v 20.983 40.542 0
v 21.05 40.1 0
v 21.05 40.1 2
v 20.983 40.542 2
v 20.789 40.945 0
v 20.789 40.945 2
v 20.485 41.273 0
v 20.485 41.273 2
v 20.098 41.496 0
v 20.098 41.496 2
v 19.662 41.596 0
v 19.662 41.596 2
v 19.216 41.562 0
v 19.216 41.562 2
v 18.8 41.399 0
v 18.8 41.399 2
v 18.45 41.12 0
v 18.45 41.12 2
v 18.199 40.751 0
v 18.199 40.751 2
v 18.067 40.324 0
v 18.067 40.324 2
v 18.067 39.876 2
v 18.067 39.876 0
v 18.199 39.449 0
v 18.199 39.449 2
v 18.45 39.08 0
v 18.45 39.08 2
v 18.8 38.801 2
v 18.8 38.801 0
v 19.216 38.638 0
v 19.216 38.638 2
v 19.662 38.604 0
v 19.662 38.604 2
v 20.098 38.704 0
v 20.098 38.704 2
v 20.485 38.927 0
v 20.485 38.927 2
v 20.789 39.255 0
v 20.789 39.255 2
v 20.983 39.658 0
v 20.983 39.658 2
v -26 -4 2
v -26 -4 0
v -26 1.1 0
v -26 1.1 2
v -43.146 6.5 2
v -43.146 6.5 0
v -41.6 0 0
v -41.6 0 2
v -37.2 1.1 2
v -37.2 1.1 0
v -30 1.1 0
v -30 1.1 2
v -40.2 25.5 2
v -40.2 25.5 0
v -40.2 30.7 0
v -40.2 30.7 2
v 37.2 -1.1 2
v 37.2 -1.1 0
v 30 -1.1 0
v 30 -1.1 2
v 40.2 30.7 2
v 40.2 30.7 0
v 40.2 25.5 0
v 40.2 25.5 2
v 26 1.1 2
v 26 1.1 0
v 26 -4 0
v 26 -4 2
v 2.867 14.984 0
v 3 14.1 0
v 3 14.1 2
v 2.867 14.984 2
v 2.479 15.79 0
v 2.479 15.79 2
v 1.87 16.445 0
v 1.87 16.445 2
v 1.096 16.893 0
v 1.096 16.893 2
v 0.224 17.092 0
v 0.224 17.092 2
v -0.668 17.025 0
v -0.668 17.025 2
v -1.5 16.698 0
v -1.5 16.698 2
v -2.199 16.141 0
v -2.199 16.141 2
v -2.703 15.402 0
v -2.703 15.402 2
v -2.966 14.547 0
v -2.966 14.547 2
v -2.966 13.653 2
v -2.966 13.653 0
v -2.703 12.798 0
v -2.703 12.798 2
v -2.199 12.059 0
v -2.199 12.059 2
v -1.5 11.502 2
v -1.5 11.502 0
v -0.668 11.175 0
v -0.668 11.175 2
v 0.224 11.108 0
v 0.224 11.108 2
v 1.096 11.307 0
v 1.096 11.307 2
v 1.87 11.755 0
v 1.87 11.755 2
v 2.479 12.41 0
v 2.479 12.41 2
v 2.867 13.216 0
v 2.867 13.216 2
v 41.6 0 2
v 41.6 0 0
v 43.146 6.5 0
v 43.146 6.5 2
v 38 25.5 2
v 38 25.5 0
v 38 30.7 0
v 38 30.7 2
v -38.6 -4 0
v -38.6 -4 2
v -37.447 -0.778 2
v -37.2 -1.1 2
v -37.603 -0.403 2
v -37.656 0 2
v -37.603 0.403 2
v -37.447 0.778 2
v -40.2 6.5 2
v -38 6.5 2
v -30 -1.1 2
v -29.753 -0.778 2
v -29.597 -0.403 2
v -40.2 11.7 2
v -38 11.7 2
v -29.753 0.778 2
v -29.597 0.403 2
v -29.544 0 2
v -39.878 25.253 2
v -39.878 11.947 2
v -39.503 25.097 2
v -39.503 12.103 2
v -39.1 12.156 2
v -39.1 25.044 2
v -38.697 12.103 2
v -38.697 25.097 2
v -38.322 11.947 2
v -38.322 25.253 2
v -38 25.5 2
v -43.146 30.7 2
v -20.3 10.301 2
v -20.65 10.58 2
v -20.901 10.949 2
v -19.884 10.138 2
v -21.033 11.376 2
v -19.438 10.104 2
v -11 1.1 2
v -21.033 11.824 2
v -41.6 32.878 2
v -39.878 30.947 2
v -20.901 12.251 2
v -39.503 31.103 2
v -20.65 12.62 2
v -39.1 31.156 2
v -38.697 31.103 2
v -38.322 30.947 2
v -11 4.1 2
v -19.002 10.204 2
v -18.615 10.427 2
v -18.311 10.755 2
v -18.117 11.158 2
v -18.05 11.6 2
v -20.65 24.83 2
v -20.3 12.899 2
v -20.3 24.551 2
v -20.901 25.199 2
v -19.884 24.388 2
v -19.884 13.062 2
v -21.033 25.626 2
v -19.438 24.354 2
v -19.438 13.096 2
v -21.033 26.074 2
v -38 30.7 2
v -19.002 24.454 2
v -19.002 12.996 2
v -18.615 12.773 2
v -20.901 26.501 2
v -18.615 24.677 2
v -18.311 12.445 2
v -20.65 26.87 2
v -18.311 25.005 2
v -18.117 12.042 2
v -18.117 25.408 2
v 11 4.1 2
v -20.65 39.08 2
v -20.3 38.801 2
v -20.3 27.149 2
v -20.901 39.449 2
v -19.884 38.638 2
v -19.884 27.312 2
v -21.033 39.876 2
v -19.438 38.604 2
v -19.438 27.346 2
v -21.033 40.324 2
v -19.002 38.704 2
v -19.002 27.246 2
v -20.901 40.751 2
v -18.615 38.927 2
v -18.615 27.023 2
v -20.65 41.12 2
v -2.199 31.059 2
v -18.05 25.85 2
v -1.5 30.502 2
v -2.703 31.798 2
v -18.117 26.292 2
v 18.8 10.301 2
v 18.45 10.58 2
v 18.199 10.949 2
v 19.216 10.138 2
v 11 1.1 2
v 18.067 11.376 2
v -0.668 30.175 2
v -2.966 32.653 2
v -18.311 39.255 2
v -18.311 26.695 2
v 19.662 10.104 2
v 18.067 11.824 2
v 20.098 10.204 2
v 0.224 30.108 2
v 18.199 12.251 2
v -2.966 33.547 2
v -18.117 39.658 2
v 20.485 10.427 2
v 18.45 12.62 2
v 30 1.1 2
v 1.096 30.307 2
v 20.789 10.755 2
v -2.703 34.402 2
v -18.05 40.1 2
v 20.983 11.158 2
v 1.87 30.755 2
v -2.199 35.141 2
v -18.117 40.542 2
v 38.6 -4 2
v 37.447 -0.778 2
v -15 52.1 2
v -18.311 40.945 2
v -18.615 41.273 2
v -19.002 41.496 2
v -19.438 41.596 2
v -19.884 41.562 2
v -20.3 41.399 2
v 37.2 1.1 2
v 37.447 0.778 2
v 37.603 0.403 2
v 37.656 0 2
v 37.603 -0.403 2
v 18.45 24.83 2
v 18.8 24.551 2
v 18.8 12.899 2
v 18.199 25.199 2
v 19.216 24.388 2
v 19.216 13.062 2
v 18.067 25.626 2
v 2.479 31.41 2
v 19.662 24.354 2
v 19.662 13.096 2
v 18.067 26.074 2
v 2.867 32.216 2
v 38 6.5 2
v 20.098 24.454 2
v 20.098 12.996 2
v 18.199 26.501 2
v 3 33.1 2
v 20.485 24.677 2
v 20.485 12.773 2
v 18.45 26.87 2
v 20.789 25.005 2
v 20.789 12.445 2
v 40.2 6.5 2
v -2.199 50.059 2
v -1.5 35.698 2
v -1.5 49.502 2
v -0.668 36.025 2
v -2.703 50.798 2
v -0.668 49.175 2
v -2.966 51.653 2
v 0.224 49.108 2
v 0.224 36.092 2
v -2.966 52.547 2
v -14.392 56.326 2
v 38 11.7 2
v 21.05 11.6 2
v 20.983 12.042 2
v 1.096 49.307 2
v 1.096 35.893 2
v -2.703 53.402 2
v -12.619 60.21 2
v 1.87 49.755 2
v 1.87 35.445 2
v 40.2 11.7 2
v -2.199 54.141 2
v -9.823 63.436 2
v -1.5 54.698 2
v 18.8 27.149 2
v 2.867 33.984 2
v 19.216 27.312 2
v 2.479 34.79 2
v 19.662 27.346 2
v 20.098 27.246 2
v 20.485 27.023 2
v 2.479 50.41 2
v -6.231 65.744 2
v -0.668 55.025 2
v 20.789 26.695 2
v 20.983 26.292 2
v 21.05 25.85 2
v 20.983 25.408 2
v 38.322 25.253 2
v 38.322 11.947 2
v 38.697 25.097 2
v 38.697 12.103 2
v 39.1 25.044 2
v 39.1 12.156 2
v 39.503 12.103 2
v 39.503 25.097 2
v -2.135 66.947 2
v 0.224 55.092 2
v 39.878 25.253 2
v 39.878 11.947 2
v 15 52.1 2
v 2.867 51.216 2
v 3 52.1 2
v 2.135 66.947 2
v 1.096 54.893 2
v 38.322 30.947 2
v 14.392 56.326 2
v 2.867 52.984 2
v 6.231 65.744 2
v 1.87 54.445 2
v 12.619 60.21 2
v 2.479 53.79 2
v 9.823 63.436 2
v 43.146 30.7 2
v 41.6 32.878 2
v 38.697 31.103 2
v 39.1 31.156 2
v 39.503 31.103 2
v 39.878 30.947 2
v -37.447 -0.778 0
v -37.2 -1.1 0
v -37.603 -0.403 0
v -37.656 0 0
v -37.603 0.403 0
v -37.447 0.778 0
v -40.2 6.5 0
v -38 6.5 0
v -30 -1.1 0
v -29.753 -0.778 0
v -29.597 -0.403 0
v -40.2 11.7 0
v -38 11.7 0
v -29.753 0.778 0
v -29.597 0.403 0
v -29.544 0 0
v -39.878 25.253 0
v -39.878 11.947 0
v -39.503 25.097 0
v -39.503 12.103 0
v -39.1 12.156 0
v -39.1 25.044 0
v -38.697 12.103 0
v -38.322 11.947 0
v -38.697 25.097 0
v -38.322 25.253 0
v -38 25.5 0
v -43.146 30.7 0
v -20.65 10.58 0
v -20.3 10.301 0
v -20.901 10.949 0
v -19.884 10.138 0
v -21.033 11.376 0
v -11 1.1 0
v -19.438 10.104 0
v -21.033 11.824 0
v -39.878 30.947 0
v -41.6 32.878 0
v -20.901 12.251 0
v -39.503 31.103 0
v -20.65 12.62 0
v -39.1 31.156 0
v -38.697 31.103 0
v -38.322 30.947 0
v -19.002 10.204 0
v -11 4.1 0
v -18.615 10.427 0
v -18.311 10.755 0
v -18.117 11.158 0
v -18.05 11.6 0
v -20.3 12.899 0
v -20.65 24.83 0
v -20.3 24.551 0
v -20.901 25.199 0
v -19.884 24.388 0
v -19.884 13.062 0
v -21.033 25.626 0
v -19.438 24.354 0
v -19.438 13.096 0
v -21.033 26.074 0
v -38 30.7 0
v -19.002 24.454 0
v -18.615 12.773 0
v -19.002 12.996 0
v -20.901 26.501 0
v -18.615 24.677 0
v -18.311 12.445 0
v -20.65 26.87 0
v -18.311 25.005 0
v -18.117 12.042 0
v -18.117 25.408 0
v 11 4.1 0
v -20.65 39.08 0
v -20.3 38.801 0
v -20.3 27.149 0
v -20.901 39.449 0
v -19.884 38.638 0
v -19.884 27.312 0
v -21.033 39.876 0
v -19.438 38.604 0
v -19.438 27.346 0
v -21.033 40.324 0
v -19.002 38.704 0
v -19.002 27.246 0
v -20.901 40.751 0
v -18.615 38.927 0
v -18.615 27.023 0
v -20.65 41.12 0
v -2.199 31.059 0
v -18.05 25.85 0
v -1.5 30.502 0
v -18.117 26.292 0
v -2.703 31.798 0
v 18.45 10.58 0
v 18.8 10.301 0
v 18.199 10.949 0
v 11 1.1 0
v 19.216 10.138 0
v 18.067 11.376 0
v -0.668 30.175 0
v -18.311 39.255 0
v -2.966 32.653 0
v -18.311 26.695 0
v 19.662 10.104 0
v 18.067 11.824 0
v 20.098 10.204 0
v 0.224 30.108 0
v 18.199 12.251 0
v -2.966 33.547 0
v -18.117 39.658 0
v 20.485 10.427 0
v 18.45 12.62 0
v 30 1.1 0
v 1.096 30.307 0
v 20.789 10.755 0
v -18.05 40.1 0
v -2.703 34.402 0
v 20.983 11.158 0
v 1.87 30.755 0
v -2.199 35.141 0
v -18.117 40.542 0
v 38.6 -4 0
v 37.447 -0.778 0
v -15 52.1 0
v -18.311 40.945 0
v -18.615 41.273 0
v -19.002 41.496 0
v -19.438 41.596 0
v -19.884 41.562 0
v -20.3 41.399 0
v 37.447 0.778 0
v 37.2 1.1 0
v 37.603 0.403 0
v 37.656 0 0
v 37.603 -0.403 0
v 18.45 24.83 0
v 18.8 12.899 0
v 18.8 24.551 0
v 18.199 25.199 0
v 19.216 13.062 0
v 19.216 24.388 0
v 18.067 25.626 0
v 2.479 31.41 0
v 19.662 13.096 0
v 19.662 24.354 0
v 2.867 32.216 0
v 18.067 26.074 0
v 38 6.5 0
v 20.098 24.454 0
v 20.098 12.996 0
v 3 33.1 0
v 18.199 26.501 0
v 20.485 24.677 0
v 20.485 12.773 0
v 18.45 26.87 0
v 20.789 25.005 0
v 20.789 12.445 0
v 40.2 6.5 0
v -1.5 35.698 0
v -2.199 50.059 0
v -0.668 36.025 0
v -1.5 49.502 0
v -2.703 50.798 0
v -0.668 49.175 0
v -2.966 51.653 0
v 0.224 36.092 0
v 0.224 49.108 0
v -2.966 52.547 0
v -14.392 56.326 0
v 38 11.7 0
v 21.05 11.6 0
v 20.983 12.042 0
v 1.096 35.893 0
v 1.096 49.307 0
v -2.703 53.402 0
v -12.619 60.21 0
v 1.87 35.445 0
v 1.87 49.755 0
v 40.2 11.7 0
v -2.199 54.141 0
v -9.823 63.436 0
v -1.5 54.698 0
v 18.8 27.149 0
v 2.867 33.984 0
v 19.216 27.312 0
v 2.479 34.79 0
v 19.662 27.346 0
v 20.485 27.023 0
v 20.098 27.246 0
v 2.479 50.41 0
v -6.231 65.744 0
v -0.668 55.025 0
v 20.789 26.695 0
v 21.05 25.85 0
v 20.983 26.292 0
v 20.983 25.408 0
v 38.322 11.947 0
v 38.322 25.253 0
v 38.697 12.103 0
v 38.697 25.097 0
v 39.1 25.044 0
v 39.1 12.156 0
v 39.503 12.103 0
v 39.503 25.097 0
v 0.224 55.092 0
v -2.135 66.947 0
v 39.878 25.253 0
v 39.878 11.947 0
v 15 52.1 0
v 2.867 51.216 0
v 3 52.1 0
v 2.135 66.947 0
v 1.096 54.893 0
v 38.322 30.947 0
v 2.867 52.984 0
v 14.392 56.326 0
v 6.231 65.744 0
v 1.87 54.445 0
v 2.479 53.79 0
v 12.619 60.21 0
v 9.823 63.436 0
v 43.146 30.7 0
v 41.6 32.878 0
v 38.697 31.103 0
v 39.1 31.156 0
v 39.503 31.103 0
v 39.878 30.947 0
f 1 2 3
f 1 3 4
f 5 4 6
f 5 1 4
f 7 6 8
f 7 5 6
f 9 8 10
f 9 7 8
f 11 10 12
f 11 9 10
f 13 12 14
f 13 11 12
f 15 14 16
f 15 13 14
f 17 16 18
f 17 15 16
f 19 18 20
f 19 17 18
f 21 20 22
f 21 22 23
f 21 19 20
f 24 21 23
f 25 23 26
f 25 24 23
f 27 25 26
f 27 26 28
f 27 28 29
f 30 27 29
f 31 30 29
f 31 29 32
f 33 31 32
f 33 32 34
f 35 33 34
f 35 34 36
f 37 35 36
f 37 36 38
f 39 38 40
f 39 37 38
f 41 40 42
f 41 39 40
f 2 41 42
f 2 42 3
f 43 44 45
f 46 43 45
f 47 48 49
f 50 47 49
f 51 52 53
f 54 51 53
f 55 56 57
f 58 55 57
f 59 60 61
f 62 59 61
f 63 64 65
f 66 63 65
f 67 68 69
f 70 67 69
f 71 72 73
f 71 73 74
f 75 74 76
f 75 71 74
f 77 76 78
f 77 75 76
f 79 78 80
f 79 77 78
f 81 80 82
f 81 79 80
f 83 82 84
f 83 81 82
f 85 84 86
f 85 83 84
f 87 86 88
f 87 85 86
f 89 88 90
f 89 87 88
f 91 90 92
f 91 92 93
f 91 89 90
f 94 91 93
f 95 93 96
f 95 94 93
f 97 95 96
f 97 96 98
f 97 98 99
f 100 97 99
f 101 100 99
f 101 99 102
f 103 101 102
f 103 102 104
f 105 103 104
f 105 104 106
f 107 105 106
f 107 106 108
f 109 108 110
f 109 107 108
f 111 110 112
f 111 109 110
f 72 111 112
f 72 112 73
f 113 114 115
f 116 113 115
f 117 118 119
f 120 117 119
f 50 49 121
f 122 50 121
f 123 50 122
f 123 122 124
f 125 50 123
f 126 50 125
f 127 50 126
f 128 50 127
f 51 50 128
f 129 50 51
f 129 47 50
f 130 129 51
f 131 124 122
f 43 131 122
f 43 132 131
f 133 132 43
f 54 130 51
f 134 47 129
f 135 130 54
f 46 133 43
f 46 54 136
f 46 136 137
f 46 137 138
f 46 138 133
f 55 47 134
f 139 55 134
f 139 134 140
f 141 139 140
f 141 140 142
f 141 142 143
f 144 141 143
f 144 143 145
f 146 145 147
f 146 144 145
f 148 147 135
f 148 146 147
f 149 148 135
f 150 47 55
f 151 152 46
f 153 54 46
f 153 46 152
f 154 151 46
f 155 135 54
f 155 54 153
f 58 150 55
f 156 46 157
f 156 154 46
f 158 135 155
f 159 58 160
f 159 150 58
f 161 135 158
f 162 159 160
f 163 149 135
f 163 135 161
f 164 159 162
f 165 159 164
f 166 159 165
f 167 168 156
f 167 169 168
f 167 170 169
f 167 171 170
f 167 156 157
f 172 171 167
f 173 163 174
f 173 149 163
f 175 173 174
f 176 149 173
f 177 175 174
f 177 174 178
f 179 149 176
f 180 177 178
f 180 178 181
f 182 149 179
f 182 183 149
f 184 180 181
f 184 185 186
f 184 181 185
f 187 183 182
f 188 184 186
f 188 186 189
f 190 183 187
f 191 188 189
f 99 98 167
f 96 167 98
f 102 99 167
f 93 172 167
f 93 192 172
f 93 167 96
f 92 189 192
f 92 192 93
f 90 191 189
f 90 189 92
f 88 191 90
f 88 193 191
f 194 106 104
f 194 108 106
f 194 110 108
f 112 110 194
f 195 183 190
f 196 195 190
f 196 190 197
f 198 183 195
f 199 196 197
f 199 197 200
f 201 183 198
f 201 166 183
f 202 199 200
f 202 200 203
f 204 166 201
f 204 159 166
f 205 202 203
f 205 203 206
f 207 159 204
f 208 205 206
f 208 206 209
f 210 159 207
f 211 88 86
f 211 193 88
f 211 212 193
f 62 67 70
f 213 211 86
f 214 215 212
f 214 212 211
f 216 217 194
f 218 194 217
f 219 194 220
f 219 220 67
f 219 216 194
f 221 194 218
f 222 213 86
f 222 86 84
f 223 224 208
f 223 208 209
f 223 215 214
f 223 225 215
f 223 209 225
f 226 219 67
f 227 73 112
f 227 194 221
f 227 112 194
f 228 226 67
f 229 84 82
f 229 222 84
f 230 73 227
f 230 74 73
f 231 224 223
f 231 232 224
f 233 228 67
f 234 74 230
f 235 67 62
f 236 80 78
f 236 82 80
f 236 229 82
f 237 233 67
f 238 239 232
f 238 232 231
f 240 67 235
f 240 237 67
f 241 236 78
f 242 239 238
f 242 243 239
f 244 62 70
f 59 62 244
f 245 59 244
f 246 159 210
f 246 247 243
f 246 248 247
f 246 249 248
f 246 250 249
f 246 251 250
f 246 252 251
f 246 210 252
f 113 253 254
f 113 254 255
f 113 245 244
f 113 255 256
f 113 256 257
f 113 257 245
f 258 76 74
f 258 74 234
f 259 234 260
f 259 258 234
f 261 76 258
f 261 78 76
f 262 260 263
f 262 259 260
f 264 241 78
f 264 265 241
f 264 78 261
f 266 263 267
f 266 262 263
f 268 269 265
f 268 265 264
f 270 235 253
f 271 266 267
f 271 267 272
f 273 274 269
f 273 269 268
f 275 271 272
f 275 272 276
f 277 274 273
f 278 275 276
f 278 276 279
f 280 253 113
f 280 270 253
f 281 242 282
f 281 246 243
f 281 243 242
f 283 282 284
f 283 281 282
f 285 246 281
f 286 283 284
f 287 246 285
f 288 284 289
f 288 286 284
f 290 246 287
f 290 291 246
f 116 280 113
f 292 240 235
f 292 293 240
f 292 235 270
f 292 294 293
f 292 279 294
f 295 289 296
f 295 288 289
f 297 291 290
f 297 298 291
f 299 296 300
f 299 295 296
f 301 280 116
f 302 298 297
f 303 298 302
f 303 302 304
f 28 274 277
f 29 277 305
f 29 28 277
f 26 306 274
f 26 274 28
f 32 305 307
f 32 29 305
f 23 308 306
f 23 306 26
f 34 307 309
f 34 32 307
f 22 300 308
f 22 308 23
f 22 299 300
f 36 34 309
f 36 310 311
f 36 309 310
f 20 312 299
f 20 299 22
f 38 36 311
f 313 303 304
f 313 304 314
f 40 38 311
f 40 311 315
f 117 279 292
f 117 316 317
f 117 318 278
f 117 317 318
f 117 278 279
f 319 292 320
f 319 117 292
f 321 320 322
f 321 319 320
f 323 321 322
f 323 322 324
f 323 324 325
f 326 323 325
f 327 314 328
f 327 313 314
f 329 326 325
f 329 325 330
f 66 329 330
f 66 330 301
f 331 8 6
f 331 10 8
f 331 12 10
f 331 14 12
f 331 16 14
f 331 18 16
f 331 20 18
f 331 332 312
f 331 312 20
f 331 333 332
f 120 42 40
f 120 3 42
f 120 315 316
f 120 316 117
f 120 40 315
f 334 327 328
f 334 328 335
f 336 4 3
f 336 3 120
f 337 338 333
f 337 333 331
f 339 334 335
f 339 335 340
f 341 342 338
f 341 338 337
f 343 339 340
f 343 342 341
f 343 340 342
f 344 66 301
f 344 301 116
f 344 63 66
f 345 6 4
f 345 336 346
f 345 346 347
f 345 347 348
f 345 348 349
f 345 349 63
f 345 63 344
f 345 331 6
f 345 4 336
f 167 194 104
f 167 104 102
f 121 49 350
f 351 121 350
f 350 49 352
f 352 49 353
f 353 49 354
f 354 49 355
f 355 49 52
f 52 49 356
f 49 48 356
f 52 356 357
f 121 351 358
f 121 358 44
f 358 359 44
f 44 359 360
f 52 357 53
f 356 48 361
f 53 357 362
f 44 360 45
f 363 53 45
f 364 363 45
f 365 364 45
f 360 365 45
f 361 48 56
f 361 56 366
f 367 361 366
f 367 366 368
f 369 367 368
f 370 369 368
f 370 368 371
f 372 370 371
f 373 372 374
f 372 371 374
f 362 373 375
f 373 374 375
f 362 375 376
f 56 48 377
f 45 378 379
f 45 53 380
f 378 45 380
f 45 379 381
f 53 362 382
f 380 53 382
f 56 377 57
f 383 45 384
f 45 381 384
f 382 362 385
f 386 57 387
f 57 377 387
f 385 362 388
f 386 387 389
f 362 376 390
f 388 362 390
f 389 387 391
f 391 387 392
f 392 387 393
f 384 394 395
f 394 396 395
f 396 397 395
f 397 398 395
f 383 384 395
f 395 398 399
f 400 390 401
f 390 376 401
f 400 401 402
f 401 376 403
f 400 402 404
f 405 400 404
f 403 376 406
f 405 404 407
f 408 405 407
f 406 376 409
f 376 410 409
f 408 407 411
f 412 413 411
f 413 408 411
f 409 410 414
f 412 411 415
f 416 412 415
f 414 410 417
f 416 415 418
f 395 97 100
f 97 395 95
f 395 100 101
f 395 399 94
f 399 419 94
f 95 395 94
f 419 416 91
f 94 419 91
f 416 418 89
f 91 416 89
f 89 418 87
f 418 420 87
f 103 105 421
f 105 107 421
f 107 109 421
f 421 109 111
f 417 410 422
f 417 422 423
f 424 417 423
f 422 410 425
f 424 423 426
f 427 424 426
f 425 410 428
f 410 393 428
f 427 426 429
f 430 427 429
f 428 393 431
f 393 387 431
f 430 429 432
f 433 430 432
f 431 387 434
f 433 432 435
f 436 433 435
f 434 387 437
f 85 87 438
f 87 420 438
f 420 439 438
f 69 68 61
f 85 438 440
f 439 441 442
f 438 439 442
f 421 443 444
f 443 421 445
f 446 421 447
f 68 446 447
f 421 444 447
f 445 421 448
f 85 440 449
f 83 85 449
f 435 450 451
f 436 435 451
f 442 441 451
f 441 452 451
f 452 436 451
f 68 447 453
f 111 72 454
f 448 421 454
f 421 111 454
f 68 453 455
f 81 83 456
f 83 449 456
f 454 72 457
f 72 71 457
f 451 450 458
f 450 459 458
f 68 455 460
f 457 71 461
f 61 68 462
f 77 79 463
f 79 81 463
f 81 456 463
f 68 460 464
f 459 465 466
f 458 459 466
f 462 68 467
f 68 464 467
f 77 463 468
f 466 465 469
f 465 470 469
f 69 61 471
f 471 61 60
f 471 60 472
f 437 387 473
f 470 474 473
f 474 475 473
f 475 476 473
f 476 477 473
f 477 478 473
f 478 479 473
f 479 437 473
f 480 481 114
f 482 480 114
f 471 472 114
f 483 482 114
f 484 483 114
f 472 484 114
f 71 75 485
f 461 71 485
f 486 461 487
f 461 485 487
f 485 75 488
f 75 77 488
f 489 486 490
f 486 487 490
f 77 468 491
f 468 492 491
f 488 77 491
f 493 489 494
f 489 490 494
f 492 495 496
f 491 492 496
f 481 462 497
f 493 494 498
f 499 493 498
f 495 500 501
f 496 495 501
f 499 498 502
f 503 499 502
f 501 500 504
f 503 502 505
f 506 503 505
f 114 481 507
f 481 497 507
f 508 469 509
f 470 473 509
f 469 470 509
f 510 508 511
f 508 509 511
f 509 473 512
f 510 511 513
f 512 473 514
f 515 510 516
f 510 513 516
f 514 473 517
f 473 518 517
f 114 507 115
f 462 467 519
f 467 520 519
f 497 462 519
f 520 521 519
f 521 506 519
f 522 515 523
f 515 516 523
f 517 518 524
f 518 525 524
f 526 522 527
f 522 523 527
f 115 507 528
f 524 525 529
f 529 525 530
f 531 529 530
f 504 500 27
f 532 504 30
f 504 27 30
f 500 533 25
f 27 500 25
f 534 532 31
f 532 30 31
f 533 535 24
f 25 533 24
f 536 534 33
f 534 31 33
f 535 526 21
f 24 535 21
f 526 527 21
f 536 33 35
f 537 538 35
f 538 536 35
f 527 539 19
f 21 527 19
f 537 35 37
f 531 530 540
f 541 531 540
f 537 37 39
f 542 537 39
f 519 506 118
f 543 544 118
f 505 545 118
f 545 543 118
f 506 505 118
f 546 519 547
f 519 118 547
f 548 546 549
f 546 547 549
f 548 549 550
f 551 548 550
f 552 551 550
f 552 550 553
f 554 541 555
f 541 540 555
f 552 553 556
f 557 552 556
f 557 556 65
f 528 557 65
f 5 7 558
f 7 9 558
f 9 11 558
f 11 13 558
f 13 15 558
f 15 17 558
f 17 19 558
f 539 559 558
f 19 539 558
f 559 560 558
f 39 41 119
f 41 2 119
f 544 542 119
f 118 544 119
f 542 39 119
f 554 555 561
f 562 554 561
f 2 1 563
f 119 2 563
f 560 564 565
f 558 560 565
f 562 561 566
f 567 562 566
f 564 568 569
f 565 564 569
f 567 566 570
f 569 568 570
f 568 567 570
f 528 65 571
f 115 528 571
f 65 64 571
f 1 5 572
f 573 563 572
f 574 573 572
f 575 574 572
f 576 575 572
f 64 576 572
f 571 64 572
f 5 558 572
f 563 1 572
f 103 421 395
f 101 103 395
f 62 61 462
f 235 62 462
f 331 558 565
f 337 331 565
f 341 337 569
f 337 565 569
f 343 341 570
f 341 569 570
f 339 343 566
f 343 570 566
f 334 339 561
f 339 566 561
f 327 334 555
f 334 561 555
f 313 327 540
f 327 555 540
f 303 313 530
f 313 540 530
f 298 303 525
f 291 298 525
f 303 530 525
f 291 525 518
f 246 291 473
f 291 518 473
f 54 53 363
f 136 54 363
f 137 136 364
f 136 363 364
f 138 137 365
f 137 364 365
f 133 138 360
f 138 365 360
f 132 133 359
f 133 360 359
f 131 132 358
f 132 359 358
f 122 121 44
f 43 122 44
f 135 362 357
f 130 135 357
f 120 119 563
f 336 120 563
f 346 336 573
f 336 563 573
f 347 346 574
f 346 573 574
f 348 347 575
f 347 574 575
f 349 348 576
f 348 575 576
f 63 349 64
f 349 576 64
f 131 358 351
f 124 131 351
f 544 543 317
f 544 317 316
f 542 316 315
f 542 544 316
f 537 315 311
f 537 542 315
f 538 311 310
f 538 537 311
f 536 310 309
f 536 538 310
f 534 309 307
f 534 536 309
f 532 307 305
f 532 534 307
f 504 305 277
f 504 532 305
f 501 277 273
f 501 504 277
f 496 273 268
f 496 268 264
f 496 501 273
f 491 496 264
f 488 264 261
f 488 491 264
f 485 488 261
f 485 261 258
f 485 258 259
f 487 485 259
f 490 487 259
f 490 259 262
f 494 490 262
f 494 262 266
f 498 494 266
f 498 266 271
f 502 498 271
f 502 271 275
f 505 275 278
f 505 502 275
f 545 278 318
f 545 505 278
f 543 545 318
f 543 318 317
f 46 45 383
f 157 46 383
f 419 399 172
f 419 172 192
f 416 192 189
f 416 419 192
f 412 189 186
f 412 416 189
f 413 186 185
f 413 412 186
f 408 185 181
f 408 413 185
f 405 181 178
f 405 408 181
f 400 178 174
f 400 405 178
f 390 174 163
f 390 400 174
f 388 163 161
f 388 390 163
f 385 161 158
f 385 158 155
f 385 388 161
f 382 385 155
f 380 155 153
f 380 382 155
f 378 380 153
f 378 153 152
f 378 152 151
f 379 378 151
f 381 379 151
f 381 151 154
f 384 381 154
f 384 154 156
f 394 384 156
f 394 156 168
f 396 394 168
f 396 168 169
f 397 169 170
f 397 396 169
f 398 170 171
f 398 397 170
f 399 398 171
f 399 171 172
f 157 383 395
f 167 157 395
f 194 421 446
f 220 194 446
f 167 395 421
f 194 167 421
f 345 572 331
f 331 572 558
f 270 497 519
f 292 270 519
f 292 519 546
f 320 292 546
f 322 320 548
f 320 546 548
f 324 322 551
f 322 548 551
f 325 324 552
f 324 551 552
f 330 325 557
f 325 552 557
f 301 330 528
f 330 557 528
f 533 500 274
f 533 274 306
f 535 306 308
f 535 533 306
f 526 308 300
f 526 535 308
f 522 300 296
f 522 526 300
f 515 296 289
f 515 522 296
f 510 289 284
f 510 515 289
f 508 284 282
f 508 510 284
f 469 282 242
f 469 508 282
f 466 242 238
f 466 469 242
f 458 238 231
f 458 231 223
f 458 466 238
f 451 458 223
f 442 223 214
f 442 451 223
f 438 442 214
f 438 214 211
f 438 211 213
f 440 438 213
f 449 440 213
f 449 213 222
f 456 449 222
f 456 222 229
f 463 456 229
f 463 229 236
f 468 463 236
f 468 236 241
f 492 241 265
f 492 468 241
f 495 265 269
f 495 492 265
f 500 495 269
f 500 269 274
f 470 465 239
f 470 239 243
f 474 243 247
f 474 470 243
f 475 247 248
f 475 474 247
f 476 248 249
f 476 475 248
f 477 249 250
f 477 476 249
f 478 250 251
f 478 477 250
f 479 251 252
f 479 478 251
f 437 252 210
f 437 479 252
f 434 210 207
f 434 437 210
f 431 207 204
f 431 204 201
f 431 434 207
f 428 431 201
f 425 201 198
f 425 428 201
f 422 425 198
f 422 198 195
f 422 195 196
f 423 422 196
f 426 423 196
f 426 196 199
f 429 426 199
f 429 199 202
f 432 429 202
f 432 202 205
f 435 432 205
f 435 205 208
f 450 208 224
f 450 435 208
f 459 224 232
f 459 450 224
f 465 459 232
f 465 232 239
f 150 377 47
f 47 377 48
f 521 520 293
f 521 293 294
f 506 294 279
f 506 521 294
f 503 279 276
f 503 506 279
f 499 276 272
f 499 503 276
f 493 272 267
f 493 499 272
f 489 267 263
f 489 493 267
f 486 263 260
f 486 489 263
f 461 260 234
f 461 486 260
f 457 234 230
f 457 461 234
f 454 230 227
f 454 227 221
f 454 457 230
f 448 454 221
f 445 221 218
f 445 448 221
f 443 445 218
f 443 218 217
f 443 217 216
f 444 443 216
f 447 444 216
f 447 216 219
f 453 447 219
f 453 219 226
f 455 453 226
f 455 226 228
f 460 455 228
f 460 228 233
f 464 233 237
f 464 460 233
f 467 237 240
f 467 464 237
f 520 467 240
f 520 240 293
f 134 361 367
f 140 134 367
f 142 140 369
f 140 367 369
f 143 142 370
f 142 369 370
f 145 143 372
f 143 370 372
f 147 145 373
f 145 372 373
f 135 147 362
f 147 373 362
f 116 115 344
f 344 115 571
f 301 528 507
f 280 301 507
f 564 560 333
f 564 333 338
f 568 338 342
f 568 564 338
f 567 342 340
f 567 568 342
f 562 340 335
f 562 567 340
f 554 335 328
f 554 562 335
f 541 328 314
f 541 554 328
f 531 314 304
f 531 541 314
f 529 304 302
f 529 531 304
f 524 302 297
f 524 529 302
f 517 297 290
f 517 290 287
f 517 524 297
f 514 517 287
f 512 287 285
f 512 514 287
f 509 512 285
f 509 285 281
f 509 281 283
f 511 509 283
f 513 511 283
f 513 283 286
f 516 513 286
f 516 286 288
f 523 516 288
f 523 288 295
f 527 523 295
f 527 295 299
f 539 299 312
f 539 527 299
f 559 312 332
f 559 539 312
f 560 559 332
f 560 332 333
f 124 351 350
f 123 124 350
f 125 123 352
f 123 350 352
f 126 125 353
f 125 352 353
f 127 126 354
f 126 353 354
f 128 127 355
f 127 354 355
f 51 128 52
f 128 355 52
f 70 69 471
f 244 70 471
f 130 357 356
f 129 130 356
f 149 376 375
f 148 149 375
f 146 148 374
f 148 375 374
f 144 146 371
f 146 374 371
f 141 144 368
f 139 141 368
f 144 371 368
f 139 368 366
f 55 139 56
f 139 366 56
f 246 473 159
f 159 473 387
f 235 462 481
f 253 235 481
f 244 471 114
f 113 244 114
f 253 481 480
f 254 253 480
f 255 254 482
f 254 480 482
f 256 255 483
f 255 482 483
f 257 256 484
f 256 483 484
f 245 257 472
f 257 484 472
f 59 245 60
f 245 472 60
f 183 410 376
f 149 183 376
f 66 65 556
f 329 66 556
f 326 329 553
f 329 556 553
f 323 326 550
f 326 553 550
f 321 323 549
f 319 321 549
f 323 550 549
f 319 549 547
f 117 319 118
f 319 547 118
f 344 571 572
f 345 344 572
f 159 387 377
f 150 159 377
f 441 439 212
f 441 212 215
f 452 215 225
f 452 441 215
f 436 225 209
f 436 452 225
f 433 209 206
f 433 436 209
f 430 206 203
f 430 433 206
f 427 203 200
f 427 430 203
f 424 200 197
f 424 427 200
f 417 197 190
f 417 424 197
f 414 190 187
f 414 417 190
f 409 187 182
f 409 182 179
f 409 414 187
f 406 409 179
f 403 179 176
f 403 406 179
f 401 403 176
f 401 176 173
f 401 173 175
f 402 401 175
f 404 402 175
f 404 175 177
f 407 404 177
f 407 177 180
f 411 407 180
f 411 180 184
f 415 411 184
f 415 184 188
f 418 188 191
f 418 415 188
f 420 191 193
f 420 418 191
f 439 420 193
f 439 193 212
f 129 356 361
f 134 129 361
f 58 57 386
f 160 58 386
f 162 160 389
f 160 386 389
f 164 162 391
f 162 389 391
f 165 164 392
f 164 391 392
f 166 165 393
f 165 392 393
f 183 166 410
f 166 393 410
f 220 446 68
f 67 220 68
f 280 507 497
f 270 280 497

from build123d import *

# Parameters (mm, degrees)
SKETCH_1_R      = 1.5
SKETCH_1_R_2    = 3
EXTRUDE_1_DEPTH = 2


with BuildPart() as part:
    # 草图1 → 凸台-拉伸1 (new body)
    with BuildSketch(Plane.XY):
        with BuildLine():
            Line((-38.6, -4), (-33.6, -4))
            Line((-33.6, -4), (-26, -4))
            Line((-26, -4), (-26, 1.1))
            Line((-26, 1.1), (-11, 1.1))
            Line((-11, 1.1), (-11, 4.1))
            Line((-11, 4.1), (11, 4.1))
            Line((11, 4.1), (11, 1.1))
            Line((11, 1.1), (26, 1.1))
            Line((26, 1.1), (26, -4))
            Line((26, -4), (33.6, -4))
            Line((33.6, -4), (38.6, -4))
            Line((38.6, -4), (41.6, 0))
            Line((41.6, 0), (43.145657482, 6.5))
            Line((43.145657482, 6.5), (43.145657482, 30.7))
            Line((43.145657482, 30.7), (41.6, 32.877506789))
            Line((41.6, 32.877506789), (15, 52.1))
            ThreePointArc((15, 52.1), (0, 67.1), (-15, 52.1))
            Line((-15, 52.1), (-41.6, 32.877506789))
            Line((-41.6, 32.877506789), (-43.145657482, 30.7))
            Line((-43.145657482, 30.7), (-43.145657482, 6.5))
            Line((-43.145657482, 6.5), (-41.6, 0))
            Line((-41.6, 0), (-38.6, -4))
        make_face()
        with BuildLine():
            Line((-30, -1.1), (-37.2, -1.1))
            ThreePointArc((-37.2, -1.1), (-37.655634919, 0), (-37.2, 1.1))
            Line((-37.2, 1.1), (-30, 1.1))
            ThreePointArc((-30, 1.1), (-29.544365081, 0), (-30, -1.1))
        make_face(mode=Mode.SUBTRACT)
        with BuildLine():
            Line((-40.2, 6.5), (-40.2, 11.7))
            ThreePointArc((-40.2, 11.7), (-39.1, 12.155634919), (-38, 11.7))
            Line((-38, 11.7), (-38, 6.5))
            Line((-38, 6.5), (-40.2, 6.5))
        make_face(mode=Mode.SUBTRACT)
        with Locations((-19.55, 11.6)):
            Circle(SKETCH_1_R, mode=Mode.SUBTRACT)
        with BuildLine():
            Line((-38, 30.7), (-38, 25.5))
            ThreePointArc((-38, 25.5), (-39.1, 25.044365081), (-40.2, 25.5))
            Line((-40.2, 25.5), (-40.2, 30.7))
            ThreePointArc((-40.2, 30.7), (-39.1, 31.155634919), (-38, 30.7))
        make_face(mode=Mode.SUBTRACT)
        with Locations((-19.55, 25.85)):
            Circle(SKETCH_1_R, mode=Mode.SUBTRACT)
        with Locations((19.55, 11.6)):
            Circle(SKETCH_1_R, mode=Mode.SUBTRACT)
        with BuildLine():
            Line((30, 1.1), (37.2, 1.1))
            ThreePointArc((37.2, 1.1), (37.655634919, 0), (37.2, -1.1))
            Line((37.2, -1.1), (30, -1.1))
            Line((30, -1.1), (30, 1.1))
        make_face(mode=Mode.SUBTRACT)
        with BuildLine():
            Line((38, 6.5), (38, 11.7))
            ThreePointArc((38, 11.7), (39.1, 12.155634919), (40.2, 11.7))
            Line((40.2, 11.7), (40.2, 6.5))
            Line((40.2, 6.5), (38, 6.5))
        make_face(mode=Mode.SUBTRACT)
        with Locations((0, 14.1)):
            Circle(SKETCH_1_R_2, mode=Mode.SUBTRACT)
        with Locations((19.55, 25.85)):
            Circle(SKETCH_1_R, mode=Mode.SUBTRACT)
        with BuildLine():
            Line((40.2, 30.7), (40.2, 25.5))
            ThreePointArc((40.2, 25.5), (39.1, 25.044365081), (38, 25.5))
            Line((38, 25.5), (38, 30.7))
            ThreePointArc((38, 30.7), (39.1, 31.155634919), (40.2, 30.7))
        make_face(mode=Mode.SUBTRACT)
        with Locations((-19.55, 40.1)):
            Circle(SKETCH_1_R, mode=Mode.SUBTRACT)
        with Locations((0, 33.1)):
            Circle(SKETCH_1_R_2, mode=Mode.SUBTRACT)
        with Locations((0, 52.1)):
            Circle(SKETCH_1_R_2, mode=Mode.SUBTRACT)
        with Locations((19.55, 40.1)):
            Circle(SKETCH_1_R, mode=Mode.SUBTRACT)
    extrude(amount=EXTRUDE_1_DEPTH)


solid = part.part
